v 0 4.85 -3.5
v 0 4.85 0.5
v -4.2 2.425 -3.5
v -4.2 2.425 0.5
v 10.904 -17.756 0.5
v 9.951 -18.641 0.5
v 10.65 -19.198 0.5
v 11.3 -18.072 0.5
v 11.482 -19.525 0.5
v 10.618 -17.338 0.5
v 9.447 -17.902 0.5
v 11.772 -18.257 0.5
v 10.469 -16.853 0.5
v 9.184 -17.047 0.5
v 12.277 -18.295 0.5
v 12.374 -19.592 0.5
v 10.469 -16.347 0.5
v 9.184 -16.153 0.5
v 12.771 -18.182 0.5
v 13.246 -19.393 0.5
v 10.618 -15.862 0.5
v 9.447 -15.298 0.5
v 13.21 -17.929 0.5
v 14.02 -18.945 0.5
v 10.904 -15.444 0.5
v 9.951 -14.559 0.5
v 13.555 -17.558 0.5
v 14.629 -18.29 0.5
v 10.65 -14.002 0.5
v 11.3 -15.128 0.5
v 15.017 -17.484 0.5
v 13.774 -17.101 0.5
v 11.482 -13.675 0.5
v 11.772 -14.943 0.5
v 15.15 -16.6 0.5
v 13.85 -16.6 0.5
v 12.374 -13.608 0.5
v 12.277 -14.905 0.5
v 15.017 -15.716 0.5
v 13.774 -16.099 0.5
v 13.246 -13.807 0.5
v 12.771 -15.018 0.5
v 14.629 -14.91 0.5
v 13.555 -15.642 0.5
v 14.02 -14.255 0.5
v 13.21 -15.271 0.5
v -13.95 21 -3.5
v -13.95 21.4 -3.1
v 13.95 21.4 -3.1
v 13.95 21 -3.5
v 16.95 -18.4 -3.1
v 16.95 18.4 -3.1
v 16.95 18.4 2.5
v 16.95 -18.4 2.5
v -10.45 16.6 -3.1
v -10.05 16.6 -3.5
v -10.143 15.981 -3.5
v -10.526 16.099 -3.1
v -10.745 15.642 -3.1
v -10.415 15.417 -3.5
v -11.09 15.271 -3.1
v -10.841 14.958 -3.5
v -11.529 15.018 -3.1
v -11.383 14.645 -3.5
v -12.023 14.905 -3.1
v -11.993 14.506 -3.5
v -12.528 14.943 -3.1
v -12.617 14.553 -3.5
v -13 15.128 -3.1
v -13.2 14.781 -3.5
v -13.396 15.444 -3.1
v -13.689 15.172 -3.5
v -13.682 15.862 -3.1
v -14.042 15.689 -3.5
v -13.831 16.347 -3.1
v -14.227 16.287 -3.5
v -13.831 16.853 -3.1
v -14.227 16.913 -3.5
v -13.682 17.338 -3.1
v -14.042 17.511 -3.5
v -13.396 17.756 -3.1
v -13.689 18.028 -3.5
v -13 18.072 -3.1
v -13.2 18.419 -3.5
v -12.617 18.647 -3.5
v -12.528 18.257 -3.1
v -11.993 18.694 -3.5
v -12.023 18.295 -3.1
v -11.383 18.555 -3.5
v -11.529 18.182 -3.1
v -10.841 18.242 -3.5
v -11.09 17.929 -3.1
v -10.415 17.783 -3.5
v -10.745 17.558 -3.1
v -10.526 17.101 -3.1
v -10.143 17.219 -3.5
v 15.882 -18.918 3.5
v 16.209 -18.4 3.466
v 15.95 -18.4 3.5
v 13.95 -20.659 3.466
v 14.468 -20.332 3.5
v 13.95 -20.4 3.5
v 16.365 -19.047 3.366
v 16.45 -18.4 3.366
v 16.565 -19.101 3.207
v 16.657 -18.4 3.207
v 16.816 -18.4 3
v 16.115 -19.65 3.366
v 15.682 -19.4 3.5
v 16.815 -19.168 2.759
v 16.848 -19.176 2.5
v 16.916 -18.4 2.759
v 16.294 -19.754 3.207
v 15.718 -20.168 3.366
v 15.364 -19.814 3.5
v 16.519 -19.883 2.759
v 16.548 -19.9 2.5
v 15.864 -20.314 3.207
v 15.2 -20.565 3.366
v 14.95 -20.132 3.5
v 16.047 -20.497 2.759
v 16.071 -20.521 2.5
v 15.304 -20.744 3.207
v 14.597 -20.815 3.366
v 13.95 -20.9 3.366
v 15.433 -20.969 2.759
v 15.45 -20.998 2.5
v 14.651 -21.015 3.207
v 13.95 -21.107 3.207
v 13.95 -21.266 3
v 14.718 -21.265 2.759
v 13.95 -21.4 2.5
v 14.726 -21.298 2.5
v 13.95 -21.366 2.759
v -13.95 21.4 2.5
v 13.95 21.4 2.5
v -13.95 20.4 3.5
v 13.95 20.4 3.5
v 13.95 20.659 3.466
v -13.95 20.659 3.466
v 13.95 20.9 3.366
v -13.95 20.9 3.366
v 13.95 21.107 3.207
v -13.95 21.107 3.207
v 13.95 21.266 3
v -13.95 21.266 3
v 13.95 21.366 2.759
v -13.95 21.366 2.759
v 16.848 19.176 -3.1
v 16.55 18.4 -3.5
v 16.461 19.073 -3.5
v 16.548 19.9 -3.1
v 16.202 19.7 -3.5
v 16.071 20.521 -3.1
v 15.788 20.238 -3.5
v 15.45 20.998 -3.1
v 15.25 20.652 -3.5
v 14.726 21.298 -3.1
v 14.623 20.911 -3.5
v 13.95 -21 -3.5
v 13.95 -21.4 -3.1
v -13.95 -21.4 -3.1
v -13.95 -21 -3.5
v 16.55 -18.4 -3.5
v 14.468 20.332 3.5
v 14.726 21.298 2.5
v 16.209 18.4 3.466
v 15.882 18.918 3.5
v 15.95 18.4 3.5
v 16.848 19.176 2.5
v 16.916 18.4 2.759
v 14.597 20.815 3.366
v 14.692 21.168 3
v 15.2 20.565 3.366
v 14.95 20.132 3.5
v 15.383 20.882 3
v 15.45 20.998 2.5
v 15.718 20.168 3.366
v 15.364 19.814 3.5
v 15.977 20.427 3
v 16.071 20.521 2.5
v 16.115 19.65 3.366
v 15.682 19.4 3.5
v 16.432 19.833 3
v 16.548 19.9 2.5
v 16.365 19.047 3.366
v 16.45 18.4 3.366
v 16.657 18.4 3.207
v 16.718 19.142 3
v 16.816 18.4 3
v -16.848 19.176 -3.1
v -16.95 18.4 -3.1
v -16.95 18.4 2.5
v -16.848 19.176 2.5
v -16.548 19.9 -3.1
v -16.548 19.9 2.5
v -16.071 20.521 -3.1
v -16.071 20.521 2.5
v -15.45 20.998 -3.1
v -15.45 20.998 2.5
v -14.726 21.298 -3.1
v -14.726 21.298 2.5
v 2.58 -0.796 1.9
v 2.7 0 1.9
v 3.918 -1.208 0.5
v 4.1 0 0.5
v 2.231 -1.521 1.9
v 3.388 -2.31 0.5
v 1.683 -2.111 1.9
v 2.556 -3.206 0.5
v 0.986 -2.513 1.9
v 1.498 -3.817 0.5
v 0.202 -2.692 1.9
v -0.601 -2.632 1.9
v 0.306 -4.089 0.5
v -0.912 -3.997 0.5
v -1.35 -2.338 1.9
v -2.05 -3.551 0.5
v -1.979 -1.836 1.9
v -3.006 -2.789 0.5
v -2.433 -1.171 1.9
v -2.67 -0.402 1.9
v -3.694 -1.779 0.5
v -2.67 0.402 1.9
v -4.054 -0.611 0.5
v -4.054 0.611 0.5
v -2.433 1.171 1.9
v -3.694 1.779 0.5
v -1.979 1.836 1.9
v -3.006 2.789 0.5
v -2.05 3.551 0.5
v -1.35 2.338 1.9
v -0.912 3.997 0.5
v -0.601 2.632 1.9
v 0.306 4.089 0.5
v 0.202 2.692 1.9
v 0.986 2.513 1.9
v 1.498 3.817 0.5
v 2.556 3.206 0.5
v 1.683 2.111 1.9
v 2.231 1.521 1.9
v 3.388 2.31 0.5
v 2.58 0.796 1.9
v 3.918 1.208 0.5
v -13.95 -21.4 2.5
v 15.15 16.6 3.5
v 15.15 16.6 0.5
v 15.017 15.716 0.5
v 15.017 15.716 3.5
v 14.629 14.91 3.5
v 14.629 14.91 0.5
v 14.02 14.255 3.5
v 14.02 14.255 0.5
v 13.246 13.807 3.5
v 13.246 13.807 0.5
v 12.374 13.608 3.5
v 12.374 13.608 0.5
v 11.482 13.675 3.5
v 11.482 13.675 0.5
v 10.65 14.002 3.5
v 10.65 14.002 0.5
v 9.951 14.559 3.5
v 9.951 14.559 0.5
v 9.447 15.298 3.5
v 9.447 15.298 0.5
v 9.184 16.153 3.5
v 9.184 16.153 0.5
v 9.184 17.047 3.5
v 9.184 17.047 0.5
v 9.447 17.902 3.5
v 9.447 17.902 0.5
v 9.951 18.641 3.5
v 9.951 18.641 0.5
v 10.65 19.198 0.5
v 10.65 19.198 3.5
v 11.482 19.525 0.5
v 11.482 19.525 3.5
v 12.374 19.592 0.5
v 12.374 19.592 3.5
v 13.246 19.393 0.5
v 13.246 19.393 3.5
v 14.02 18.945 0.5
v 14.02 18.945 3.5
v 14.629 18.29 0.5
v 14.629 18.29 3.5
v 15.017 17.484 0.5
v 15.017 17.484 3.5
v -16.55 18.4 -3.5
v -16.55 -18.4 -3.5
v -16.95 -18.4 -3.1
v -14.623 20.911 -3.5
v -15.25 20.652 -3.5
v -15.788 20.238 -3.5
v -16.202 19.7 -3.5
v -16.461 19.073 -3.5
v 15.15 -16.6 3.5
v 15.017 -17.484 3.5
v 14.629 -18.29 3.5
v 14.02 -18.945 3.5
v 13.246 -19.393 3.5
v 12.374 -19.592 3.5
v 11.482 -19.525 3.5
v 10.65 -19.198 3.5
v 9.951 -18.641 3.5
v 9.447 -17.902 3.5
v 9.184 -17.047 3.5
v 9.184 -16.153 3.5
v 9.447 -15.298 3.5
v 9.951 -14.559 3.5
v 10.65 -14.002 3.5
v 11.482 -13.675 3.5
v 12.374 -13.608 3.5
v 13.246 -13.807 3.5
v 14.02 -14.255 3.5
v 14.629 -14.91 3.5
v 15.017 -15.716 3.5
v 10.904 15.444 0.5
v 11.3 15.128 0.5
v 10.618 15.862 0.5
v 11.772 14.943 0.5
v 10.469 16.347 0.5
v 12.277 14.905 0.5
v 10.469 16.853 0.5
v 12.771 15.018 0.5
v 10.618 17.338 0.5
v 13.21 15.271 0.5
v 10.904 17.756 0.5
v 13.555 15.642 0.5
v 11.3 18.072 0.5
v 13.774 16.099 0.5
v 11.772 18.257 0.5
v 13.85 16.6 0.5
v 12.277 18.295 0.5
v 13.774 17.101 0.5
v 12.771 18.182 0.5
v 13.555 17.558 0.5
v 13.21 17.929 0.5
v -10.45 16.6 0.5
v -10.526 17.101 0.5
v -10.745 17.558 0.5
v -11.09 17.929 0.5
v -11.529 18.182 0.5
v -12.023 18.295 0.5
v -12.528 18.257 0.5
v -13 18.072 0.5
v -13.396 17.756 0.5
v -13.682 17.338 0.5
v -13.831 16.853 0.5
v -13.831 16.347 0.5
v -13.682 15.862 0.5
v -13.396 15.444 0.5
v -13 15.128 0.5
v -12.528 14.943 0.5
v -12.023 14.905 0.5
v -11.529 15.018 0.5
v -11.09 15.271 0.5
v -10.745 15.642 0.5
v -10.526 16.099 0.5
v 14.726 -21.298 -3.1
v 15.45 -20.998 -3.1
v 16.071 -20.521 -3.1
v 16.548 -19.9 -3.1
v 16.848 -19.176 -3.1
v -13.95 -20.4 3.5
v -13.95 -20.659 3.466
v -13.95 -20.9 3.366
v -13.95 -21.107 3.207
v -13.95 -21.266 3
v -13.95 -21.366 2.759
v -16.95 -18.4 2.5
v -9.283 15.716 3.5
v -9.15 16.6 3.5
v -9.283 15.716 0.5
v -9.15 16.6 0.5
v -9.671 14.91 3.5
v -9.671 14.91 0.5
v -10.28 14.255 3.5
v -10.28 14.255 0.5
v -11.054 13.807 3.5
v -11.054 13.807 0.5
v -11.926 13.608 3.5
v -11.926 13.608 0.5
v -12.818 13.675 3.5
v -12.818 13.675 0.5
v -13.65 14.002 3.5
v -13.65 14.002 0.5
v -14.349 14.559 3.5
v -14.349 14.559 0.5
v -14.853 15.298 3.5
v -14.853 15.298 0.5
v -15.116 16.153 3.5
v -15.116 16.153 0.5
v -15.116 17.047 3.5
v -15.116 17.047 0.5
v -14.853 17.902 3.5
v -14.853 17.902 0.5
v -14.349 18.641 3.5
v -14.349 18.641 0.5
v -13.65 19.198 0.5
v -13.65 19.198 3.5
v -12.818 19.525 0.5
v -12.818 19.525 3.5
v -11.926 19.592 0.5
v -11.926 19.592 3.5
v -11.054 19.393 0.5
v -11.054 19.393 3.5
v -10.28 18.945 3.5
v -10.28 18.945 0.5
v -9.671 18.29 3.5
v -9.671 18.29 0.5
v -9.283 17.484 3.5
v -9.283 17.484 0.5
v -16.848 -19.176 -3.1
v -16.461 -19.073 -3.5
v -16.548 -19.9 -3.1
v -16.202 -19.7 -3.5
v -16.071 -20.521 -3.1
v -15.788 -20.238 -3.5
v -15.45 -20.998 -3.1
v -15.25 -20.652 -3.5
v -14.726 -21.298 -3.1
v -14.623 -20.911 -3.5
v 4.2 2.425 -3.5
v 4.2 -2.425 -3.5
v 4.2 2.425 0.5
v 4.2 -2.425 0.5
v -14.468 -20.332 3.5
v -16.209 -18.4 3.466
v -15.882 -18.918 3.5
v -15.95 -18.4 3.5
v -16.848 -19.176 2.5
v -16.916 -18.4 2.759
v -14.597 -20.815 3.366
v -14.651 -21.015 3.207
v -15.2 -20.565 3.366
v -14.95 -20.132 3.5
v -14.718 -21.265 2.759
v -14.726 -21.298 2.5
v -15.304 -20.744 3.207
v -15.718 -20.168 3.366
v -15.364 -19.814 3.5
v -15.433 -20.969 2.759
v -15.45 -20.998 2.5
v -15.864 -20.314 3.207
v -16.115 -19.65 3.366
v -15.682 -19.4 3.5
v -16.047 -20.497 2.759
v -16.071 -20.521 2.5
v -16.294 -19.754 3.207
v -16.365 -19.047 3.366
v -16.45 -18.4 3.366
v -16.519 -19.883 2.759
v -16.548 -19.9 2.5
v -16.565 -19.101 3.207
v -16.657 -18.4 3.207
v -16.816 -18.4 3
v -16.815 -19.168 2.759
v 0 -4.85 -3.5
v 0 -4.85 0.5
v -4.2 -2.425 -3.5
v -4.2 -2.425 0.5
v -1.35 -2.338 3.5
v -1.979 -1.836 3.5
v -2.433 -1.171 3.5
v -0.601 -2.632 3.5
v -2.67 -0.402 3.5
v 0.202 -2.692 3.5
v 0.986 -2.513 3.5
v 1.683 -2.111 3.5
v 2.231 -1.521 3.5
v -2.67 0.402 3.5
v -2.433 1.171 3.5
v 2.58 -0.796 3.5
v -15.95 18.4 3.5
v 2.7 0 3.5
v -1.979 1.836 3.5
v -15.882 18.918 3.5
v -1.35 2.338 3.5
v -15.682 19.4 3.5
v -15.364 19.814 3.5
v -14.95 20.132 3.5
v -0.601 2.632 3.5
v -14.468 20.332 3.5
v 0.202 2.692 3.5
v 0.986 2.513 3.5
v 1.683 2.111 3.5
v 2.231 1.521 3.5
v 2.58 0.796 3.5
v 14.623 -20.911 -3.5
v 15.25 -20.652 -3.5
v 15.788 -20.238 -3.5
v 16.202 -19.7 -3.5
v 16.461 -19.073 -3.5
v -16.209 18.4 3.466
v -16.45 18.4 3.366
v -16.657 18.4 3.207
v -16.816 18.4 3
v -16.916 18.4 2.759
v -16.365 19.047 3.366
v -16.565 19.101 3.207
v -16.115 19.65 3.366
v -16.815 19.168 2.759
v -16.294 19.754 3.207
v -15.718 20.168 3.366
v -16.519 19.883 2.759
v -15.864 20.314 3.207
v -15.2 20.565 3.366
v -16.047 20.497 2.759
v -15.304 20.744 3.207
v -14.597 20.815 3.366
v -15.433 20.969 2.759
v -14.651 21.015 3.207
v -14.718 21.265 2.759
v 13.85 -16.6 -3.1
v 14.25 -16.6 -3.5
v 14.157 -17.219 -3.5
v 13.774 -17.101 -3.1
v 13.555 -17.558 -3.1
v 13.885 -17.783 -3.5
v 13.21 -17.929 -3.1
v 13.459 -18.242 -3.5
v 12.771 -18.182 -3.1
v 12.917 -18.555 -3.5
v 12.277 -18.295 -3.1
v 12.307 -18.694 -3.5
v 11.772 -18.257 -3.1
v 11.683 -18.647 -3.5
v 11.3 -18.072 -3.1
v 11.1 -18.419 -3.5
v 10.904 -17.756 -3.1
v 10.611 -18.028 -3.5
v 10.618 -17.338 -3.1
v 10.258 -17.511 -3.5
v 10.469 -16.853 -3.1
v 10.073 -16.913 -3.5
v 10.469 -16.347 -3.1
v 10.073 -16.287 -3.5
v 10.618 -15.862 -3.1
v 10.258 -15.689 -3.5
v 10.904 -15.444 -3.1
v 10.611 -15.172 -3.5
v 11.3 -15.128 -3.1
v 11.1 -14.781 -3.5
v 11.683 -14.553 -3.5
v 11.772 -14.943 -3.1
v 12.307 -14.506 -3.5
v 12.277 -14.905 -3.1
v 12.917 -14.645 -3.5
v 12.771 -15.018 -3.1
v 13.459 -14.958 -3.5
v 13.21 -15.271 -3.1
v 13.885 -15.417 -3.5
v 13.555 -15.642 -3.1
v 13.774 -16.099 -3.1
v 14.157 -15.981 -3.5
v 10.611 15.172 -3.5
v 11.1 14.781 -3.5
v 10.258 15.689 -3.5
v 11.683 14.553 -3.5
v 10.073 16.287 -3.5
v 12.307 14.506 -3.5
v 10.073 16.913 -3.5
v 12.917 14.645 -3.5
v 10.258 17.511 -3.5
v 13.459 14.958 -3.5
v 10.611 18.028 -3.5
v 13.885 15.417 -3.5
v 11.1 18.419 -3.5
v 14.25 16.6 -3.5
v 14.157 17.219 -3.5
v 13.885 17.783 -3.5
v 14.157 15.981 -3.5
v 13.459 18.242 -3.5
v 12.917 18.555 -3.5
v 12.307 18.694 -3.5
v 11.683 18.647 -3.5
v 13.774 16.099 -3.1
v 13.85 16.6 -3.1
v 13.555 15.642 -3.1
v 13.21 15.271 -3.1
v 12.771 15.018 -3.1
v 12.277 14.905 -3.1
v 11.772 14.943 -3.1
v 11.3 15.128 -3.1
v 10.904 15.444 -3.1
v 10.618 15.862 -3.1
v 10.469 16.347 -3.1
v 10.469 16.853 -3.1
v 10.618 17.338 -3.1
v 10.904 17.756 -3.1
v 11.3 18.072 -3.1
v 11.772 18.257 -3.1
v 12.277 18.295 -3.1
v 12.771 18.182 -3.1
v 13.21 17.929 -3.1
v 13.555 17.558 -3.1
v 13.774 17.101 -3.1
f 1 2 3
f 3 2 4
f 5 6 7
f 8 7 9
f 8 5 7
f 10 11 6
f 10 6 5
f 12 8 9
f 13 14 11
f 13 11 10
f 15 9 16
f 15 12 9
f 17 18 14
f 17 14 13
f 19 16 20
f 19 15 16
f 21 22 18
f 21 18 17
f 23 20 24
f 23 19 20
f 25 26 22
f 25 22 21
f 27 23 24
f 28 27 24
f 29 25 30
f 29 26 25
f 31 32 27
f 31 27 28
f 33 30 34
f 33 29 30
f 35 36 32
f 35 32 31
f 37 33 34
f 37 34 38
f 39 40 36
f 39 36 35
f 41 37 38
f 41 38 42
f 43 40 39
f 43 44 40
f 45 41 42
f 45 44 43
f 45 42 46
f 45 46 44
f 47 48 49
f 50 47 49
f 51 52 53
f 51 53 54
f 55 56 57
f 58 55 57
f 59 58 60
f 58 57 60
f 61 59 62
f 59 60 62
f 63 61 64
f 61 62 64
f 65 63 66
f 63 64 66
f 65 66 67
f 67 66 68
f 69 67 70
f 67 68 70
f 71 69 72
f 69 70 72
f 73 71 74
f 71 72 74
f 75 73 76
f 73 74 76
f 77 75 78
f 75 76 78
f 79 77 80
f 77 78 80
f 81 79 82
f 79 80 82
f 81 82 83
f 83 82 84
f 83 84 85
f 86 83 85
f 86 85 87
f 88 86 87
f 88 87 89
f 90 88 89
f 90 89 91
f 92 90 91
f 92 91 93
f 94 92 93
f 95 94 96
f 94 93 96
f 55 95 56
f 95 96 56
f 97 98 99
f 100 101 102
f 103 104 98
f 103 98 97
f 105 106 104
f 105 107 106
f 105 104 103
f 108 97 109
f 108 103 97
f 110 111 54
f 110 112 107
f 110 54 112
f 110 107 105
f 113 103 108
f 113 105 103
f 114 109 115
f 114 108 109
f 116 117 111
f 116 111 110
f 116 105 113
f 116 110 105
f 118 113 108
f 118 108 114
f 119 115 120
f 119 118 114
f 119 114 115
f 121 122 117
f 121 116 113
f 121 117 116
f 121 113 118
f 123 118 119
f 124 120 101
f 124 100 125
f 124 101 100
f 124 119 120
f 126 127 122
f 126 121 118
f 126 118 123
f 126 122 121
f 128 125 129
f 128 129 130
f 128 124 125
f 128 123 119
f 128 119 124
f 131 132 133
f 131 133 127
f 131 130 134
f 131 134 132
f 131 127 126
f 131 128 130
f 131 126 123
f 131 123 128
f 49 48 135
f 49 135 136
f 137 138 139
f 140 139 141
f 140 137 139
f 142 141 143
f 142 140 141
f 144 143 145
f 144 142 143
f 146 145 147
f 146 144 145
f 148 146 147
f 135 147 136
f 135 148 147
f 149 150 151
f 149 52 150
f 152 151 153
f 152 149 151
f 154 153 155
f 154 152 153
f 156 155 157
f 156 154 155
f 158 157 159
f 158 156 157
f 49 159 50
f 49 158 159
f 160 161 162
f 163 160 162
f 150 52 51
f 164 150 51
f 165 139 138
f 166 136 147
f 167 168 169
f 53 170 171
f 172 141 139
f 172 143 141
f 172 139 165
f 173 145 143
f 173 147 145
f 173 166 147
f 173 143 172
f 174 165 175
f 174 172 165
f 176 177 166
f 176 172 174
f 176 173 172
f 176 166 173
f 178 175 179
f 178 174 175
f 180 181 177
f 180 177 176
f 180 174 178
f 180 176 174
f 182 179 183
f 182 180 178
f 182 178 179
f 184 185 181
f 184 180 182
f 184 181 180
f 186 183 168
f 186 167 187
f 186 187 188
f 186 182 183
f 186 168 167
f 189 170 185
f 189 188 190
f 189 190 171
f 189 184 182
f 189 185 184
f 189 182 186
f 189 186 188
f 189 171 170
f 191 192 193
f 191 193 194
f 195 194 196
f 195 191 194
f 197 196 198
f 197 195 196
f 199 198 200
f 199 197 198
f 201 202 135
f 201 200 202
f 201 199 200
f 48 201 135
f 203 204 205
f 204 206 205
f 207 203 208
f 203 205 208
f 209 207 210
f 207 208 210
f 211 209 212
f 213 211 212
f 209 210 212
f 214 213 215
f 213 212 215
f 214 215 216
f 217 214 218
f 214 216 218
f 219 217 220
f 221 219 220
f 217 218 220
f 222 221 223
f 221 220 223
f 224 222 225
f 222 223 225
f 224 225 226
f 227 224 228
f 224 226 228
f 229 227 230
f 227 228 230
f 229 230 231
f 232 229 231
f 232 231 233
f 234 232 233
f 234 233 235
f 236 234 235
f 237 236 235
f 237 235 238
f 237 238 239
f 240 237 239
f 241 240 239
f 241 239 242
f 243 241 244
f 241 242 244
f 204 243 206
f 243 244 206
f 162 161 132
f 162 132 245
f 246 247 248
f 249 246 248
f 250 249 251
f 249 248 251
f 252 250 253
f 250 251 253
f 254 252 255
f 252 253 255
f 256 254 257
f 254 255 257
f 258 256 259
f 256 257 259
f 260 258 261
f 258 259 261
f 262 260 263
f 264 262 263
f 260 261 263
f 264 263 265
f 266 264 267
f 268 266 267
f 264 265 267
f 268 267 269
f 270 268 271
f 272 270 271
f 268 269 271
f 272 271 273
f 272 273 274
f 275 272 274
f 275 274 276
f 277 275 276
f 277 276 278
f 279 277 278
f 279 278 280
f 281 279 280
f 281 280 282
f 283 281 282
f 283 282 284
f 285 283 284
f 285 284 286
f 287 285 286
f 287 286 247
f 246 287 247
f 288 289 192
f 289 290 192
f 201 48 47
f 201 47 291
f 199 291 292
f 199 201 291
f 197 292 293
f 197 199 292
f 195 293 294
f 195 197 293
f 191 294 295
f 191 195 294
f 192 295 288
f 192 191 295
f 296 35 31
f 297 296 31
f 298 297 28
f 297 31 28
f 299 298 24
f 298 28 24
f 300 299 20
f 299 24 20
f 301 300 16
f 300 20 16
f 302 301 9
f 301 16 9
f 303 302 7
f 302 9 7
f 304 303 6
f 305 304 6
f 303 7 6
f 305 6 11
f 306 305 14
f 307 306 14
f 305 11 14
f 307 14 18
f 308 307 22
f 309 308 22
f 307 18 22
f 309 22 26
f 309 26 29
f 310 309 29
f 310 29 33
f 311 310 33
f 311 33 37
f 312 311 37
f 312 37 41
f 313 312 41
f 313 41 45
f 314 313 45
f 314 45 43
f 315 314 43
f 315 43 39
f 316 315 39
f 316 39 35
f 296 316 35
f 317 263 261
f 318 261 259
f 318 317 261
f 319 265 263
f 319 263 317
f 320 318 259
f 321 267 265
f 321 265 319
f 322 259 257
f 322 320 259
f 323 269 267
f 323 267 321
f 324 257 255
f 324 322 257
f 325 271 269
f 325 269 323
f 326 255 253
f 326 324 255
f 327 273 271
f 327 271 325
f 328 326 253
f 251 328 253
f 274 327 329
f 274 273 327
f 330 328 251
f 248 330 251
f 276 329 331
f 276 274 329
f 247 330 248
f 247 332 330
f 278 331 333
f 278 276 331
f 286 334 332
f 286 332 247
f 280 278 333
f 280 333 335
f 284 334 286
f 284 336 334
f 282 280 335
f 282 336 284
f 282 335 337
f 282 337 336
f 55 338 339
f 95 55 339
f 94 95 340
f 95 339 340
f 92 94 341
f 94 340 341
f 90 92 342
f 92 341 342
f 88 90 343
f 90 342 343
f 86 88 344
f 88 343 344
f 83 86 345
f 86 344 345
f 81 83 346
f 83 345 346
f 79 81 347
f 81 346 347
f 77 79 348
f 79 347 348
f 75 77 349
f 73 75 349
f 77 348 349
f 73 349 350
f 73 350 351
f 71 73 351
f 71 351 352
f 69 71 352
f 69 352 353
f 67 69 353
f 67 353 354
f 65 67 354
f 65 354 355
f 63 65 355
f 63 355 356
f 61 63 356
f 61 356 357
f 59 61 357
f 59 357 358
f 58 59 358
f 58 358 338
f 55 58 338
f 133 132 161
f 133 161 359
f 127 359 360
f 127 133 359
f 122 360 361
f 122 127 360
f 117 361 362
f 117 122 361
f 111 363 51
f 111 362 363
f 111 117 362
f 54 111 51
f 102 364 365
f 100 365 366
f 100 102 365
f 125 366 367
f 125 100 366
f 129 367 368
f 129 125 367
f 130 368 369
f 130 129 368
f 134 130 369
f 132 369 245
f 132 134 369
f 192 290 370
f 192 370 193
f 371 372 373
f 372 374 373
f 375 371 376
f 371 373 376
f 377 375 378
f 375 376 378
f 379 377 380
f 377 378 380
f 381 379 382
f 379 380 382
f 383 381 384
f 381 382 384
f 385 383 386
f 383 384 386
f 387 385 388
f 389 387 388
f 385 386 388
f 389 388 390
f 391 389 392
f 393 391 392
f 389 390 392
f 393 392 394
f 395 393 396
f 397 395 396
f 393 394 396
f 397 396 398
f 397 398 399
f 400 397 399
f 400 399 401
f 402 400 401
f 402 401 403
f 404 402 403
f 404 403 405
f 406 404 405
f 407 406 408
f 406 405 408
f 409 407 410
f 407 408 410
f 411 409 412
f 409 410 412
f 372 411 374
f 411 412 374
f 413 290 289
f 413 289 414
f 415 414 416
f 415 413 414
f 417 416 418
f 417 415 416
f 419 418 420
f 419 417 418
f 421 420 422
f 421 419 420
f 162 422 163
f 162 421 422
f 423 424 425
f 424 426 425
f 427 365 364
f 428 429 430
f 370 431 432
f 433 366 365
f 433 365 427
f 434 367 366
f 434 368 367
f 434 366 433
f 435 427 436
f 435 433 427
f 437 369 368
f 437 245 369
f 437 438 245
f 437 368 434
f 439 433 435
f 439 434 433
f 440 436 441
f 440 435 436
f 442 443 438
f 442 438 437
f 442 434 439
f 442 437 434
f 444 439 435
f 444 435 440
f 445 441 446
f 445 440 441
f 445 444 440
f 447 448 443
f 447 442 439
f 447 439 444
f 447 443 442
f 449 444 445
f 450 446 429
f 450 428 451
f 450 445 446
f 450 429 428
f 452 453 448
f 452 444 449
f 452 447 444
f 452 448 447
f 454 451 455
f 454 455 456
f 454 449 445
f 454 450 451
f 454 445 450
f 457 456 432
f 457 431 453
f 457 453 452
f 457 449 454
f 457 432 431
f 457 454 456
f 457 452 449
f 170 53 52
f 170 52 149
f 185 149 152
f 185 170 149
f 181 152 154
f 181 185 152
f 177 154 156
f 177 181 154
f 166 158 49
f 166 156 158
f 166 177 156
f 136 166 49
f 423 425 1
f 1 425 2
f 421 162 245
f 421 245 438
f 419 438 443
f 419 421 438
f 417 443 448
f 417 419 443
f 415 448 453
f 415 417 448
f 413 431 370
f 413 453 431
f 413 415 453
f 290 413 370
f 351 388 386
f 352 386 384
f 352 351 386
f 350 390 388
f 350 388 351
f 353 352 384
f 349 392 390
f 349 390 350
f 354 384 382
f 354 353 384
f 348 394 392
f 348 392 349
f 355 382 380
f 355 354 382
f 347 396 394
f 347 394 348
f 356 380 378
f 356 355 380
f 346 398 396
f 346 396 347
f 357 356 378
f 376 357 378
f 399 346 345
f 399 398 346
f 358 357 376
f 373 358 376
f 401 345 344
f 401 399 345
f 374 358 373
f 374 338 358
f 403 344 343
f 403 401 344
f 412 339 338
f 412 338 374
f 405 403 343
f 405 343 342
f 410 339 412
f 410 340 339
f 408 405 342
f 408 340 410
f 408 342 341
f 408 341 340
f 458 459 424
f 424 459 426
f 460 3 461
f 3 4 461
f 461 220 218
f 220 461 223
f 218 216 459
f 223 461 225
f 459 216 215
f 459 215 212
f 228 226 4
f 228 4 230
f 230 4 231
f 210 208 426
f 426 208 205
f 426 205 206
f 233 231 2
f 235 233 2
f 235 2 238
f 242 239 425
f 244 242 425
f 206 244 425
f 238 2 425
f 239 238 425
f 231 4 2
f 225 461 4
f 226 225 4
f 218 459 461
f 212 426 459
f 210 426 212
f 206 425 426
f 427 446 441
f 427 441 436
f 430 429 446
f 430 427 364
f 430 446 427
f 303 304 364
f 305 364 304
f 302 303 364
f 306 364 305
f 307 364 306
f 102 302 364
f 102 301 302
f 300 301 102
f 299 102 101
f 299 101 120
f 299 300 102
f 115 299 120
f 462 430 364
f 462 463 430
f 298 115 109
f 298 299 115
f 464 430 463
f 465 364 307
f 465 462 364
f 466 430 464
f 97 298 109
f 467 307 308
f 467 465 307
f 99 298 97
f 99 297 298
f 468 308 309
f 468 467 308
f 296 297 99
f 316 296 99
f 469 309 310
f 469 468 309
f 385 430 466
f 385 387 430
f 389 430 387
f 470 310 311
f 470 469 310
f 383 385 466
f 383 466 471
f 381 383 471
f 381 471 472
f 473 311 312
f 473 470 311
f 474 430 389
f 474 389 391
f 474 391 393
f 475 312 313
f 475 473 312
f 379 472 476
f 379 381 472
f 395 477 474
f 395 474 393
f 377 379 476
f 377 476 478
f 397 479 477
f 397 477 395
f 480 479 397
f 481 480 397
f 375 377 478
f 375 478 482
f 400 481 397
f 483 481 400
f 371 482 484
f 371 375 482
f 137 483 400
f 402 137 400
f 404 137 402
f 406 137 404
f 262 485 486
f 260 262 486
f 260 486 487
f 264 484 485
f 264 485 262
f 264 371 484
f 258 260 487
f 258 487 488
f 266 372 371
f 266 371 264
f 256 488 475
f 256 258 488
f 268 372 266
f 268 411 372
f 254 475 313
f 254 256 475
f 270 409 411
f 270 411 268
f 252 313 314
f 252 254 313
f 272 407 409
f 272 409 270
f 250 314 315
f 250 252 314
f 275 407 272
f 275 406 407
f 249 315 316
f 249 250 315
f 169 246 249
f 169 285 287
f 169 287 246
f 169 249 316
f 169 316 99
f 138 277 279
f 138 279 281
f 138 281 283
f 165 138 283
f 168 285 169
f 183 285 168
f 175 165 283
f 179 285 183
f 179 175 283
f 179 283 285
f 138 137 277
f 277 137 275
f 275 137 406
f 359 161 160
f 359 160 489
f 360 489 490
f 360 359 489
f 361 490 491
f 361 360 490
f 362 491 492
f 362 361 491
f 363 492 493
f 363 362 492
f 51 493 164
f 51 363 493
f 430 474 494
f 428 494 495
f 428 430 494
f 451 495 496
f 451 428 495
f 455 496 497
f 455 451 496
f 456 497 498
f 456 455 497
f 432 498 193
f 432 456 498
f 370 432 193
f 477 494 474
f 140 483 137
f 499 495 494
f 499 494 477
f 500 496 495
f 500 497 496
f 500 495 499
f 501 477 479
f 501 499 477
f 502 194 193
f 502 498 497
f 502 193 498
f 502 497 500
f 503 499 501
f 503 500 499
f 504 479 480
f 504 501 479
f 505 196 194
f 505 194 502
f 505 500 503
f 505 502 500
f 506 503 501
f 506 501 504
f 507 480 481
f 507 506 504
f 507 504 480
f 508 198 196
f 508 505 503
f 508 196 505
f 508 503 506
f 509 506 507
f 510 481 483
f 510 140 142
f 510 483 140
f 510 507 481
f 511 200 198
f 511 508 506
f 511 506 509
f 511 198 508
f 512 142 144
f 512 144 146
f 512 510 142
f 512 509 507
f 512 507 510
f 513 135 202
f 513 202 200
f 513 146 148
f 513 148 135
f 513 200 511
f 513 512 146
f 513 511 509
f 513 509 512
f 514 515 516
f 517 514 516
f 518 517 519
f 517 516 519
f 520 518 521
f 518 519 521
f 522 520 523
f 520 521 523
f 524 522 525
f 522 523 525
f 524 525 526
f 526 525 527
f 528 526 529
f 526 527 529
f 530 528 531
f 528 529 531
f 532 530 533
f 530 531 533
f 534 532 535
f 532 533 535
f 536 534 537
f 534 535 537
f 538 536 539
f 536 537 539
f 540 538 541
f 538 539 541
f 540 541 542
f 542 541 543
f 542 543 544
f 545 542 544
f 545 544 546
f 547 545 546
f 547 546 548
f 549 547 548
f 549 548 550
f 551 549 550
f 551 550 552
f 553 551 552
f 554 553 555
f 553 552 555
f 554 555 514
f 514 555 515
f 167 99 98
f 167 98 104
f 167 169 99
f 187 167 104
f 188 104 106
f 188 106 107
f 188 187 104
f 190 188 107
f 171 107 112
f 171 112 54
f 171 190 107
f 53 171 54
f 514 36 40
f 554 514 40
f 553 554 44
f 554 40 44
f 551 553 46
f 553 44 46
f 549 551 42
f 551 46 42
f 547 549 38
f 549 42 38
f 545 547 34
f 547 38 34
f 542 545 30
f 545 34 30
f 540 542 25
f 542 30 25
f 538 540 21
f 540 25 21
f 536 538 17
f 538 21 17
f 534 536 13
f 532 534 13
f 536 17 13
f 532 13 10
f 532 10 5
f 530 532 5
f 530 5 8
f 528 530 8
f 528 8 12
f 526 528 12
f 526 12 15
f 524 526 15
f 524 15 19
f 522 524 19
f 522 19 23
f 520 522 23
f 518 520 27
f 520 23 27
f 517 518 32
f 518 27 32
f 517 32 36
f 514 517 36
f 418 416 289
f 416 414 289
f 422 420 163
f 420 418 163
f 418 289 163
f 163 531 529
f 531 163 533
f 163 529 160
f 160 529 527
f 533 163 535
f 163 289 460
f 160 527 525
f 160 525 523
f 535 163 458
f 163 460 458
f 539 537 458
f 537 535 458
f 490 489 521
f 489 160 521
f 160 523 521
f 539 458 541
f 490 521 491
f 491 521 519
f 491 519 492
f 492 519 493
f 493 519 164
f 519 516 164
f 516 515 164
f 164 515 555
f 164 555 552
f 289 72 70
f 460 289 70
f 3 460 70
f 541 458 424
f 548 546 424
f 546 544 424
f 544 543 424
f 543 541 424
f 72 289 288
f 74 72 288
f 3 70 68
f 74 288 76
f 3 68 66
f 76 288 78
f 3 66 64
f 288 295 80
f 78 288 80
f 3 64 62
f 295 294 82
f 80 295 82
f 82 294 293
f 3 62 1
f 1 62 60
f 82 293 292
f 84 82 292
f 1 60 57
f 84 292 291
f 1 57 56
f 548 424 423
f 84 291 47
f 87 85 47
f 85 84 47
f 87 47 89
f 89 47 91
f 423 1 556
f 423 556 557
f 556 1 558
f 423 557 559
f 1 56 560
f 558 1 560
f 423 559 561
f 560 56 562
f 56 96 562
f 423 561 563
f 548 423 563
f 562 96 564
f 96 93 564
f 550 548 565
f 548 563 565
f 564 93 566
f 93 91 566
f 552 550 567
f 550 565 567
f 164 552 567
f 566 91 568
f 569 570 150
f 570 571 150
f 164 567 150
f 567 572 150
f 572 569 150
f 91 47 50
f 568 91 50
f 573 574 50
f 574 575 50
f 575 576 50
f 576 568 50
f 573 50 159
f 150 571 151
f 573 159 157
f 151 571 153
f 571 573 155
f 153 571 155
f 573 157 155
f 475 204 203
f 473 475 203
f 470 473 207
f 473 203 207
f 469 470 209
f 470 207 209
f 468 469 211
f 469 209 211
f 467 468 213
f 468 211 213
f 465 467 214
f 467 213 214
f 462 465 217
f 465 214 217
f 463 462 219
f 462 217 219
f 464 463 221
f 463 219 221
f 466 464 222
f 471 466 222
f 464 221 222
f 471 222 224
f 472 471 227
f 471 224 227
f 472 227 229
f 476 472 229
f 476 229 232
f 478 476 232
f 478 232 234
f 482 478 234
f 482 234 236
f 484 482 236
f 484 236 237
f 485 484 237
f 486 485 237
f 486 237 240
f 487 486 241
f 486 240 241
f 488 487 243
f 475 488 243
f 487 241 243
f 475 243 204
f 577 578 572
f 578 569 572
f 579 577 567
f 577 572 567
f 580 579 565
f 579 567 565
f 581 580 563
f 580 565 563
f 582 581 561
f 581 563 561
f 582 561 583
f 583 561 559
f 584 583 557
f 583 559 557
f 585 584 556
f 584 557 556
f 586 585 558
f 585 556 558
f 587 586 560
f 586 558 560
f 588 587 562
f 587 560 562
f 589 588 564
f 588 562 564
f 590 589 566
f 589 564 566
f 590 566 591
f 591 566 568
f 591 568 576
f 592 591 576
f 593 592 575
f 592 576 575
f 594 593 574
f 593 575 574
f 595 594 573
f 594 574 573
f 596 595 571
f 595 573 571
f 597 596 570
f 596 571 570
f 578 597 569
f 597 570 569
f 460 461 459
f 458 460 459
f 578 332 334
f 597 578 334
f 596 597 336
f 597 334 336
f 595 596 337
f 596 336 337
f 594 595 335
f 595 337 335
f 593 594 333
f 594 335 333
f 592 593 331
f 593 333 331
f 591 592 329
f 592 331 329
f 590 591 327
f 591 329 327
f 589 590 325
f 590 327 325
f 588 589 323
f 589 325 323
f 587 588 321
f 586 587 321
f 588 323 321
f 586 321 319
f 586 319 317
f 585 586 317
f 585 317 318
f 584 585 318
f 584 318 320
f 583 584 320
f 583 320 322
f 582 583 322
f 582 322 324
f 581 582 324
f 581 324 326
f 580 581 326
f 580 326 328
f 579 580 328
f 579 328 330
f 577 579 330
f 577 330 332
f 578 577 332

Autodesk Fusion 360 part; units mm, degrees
sketch "Sketch1" plane through (0, 0, 0) normal (0, 0, 1) x (1, 0, 0) in component "[a]_z_drive_baseplate_a_x2"
  line L0 (16.95, -21.4) -> (-16.95, -21.4)
  line L1 (-16.95, -21.4) -> (-16.95, 21.4)
  line L2 (-16.95, 21.4) -> (16.95, 21.4)
  line L3 (16.95, 21.4) -> (16.95, -21.4)
  line L4 (16.95, -21.4) -> (-16.95, 21.4) construction
  line L5 (-16.95, -21.4) -> (16.95, 21.4) construction
  circle A0 centre (0, 0) radius 2.7
  circle A1 centre (-12.15, 16.6) radius 3
  circle A2 centre (-12.15, 16.6) radius 1.7
  line L6 (4.2, 2.4249) -> (0, 4.8497)
  line L7 (0, 4.8497) -> (-4.2, 2.4249)
  line L8 (-4.2, 2.4249) -> (-4.2, -2.4249)
  line L9 (-4.2, -2.4249) -> (0, -4.8497)
  line L10 (0, -4.8497) -> (4.2, -2.4249)
  line L11 (4.2, -2.4249) -> (4.2, 2.4249)
  line L12 (0, -25) -> (0, 28) construction
  line L13 (-30, 0) -> (30, 0) construction
  circle A3 centre (12.15, 16.6) radius 3
  circle A4 centre (12.15, 16.6) radius 1.7
  circle A5 centre (12.15, -16.6) radius 3
  circle A6 centre (12.15, -16.6) radius 1.7
  circle A7 centre (0, 0) radius 4.1
  dimension "d1" = 33.9
  dimension "d2" = 42.8
  dimension "d3" = 5.4
  dimension "d4" = 6
  dimension "d5" = 4.8
  dimension "d6" = 4.8
  dimension "d7" = 3.4
  dimension "d8" = 4.2
  dimension "d18" = 8.2
extrude "Extrude1" add sketch "Sketch1" along normal mid plane 7 contours L0 L1 L2 L3 | A0 | A1 | A2 | L6 L7 L8 L9 L10 L11 | A3 | A4 | A5 | A6 | A7 in component "[a]_z_drive_baseplate_a_x2"
fillet "Fillet1" radius 3 4 edges at (16.95, -21.4, 0) (-16.95, -21.4, 0) (-16.95, 21.4, 0) (16.95, 21.4, 0) in component "[a]_z_drive_baseplate_a_x2"
extrude "Extrude2" cut sketch "Sketch1" along normal through all and the other way through all contours A0 | A2 | A4 | A6 in component "[a]_z_drive_baseplate_a_x2"
extrude "Extrude3" cut sketch "Sketch1" along normal through all from surface at 0.5 contours A1 | A2 | A3 | A4 | A5 | A6 in component "[a]_z_drive_baseplate_a_x2"
extrude "Extrude4" cut sketch "Sketch1" against normal through all from surface at 0.5 contours A0 | L6 L7 L8 L9 L10 L11 | A7 in component "[a]_z_drive_baseplate_a_x2"
sketch "Sketch2" plane through (0, 0, 0) normal (0, 0, 1) x (1, 0, 0) in component "[a]_z_drive_baseplate_a_x2"
sketch "Sketch3" plane through (0, 0, 0.5) normal (0, 0, -1) x (1, 0, 0) in component "[a]_z_drive_baseplate_a_x2"
  line L0 (4.2, -2.4249) -> (4.2, 2.4249)
  line L1 (4.2, 2.4249) -> (0, 4.8497)
  line L2 (0, 4.8497) -> (-4.2, 2.4249)
  line L3 (-4.2, 2.4249) -> (-4.2, -2.4249)
  line L4 (-4.2, -2.4249) -> (0, -4.8497)
  line L5 (0, -4.8497) -> (4.2, -2.4249)
  circle A0 centre (0, 0) radius 4.1
extrude "Extrude5" cut sketch "Sketch3" against normal through all draft -45 contours A0 in component "[a]_z_drive_baseplate_a_x2"
chamfer "Chamfer1" distance 0.4 angle 45 11 edges at (0, 21.4, -3.5) (16.0713, 20.5213, -3.5) (16.95, 0, -3.5) (16.0713, -20.5213, -3.5) (0, -21.4, -3.5) (-16.0713, -20.5213, -3.5) (-16.95, 0, -3.5) (-16.0713, 20.5213, -3.5) (10.565, 15.9853, -3.5) (10.565, -17.2147, -3.5) (-13.735, 15.9853, -3.5) in component "[a]_z_drive_baseplate_a_x2"
fillet "Fillet2" radius 1 8 edges at (16.0713, 20.5213, 3.5) (0, 21.4, 3.5) (-16.0713, 20.5213, 3.5) (-16.95, 0, 3.5) (-16.0713, -20.5213, 3.5) (0, -21.4, 3.5) (16.0713, -20.5213, 3.5) (16.95, 0, 3.5) in component "[a]_z_drive_baseplate_a_x2"
component "[a]_z_drive_baseplate_a_x2" placed x (1, 0, 0) y (0, 1, 0) z (0, 0, 1) at (0, 0, 0)
